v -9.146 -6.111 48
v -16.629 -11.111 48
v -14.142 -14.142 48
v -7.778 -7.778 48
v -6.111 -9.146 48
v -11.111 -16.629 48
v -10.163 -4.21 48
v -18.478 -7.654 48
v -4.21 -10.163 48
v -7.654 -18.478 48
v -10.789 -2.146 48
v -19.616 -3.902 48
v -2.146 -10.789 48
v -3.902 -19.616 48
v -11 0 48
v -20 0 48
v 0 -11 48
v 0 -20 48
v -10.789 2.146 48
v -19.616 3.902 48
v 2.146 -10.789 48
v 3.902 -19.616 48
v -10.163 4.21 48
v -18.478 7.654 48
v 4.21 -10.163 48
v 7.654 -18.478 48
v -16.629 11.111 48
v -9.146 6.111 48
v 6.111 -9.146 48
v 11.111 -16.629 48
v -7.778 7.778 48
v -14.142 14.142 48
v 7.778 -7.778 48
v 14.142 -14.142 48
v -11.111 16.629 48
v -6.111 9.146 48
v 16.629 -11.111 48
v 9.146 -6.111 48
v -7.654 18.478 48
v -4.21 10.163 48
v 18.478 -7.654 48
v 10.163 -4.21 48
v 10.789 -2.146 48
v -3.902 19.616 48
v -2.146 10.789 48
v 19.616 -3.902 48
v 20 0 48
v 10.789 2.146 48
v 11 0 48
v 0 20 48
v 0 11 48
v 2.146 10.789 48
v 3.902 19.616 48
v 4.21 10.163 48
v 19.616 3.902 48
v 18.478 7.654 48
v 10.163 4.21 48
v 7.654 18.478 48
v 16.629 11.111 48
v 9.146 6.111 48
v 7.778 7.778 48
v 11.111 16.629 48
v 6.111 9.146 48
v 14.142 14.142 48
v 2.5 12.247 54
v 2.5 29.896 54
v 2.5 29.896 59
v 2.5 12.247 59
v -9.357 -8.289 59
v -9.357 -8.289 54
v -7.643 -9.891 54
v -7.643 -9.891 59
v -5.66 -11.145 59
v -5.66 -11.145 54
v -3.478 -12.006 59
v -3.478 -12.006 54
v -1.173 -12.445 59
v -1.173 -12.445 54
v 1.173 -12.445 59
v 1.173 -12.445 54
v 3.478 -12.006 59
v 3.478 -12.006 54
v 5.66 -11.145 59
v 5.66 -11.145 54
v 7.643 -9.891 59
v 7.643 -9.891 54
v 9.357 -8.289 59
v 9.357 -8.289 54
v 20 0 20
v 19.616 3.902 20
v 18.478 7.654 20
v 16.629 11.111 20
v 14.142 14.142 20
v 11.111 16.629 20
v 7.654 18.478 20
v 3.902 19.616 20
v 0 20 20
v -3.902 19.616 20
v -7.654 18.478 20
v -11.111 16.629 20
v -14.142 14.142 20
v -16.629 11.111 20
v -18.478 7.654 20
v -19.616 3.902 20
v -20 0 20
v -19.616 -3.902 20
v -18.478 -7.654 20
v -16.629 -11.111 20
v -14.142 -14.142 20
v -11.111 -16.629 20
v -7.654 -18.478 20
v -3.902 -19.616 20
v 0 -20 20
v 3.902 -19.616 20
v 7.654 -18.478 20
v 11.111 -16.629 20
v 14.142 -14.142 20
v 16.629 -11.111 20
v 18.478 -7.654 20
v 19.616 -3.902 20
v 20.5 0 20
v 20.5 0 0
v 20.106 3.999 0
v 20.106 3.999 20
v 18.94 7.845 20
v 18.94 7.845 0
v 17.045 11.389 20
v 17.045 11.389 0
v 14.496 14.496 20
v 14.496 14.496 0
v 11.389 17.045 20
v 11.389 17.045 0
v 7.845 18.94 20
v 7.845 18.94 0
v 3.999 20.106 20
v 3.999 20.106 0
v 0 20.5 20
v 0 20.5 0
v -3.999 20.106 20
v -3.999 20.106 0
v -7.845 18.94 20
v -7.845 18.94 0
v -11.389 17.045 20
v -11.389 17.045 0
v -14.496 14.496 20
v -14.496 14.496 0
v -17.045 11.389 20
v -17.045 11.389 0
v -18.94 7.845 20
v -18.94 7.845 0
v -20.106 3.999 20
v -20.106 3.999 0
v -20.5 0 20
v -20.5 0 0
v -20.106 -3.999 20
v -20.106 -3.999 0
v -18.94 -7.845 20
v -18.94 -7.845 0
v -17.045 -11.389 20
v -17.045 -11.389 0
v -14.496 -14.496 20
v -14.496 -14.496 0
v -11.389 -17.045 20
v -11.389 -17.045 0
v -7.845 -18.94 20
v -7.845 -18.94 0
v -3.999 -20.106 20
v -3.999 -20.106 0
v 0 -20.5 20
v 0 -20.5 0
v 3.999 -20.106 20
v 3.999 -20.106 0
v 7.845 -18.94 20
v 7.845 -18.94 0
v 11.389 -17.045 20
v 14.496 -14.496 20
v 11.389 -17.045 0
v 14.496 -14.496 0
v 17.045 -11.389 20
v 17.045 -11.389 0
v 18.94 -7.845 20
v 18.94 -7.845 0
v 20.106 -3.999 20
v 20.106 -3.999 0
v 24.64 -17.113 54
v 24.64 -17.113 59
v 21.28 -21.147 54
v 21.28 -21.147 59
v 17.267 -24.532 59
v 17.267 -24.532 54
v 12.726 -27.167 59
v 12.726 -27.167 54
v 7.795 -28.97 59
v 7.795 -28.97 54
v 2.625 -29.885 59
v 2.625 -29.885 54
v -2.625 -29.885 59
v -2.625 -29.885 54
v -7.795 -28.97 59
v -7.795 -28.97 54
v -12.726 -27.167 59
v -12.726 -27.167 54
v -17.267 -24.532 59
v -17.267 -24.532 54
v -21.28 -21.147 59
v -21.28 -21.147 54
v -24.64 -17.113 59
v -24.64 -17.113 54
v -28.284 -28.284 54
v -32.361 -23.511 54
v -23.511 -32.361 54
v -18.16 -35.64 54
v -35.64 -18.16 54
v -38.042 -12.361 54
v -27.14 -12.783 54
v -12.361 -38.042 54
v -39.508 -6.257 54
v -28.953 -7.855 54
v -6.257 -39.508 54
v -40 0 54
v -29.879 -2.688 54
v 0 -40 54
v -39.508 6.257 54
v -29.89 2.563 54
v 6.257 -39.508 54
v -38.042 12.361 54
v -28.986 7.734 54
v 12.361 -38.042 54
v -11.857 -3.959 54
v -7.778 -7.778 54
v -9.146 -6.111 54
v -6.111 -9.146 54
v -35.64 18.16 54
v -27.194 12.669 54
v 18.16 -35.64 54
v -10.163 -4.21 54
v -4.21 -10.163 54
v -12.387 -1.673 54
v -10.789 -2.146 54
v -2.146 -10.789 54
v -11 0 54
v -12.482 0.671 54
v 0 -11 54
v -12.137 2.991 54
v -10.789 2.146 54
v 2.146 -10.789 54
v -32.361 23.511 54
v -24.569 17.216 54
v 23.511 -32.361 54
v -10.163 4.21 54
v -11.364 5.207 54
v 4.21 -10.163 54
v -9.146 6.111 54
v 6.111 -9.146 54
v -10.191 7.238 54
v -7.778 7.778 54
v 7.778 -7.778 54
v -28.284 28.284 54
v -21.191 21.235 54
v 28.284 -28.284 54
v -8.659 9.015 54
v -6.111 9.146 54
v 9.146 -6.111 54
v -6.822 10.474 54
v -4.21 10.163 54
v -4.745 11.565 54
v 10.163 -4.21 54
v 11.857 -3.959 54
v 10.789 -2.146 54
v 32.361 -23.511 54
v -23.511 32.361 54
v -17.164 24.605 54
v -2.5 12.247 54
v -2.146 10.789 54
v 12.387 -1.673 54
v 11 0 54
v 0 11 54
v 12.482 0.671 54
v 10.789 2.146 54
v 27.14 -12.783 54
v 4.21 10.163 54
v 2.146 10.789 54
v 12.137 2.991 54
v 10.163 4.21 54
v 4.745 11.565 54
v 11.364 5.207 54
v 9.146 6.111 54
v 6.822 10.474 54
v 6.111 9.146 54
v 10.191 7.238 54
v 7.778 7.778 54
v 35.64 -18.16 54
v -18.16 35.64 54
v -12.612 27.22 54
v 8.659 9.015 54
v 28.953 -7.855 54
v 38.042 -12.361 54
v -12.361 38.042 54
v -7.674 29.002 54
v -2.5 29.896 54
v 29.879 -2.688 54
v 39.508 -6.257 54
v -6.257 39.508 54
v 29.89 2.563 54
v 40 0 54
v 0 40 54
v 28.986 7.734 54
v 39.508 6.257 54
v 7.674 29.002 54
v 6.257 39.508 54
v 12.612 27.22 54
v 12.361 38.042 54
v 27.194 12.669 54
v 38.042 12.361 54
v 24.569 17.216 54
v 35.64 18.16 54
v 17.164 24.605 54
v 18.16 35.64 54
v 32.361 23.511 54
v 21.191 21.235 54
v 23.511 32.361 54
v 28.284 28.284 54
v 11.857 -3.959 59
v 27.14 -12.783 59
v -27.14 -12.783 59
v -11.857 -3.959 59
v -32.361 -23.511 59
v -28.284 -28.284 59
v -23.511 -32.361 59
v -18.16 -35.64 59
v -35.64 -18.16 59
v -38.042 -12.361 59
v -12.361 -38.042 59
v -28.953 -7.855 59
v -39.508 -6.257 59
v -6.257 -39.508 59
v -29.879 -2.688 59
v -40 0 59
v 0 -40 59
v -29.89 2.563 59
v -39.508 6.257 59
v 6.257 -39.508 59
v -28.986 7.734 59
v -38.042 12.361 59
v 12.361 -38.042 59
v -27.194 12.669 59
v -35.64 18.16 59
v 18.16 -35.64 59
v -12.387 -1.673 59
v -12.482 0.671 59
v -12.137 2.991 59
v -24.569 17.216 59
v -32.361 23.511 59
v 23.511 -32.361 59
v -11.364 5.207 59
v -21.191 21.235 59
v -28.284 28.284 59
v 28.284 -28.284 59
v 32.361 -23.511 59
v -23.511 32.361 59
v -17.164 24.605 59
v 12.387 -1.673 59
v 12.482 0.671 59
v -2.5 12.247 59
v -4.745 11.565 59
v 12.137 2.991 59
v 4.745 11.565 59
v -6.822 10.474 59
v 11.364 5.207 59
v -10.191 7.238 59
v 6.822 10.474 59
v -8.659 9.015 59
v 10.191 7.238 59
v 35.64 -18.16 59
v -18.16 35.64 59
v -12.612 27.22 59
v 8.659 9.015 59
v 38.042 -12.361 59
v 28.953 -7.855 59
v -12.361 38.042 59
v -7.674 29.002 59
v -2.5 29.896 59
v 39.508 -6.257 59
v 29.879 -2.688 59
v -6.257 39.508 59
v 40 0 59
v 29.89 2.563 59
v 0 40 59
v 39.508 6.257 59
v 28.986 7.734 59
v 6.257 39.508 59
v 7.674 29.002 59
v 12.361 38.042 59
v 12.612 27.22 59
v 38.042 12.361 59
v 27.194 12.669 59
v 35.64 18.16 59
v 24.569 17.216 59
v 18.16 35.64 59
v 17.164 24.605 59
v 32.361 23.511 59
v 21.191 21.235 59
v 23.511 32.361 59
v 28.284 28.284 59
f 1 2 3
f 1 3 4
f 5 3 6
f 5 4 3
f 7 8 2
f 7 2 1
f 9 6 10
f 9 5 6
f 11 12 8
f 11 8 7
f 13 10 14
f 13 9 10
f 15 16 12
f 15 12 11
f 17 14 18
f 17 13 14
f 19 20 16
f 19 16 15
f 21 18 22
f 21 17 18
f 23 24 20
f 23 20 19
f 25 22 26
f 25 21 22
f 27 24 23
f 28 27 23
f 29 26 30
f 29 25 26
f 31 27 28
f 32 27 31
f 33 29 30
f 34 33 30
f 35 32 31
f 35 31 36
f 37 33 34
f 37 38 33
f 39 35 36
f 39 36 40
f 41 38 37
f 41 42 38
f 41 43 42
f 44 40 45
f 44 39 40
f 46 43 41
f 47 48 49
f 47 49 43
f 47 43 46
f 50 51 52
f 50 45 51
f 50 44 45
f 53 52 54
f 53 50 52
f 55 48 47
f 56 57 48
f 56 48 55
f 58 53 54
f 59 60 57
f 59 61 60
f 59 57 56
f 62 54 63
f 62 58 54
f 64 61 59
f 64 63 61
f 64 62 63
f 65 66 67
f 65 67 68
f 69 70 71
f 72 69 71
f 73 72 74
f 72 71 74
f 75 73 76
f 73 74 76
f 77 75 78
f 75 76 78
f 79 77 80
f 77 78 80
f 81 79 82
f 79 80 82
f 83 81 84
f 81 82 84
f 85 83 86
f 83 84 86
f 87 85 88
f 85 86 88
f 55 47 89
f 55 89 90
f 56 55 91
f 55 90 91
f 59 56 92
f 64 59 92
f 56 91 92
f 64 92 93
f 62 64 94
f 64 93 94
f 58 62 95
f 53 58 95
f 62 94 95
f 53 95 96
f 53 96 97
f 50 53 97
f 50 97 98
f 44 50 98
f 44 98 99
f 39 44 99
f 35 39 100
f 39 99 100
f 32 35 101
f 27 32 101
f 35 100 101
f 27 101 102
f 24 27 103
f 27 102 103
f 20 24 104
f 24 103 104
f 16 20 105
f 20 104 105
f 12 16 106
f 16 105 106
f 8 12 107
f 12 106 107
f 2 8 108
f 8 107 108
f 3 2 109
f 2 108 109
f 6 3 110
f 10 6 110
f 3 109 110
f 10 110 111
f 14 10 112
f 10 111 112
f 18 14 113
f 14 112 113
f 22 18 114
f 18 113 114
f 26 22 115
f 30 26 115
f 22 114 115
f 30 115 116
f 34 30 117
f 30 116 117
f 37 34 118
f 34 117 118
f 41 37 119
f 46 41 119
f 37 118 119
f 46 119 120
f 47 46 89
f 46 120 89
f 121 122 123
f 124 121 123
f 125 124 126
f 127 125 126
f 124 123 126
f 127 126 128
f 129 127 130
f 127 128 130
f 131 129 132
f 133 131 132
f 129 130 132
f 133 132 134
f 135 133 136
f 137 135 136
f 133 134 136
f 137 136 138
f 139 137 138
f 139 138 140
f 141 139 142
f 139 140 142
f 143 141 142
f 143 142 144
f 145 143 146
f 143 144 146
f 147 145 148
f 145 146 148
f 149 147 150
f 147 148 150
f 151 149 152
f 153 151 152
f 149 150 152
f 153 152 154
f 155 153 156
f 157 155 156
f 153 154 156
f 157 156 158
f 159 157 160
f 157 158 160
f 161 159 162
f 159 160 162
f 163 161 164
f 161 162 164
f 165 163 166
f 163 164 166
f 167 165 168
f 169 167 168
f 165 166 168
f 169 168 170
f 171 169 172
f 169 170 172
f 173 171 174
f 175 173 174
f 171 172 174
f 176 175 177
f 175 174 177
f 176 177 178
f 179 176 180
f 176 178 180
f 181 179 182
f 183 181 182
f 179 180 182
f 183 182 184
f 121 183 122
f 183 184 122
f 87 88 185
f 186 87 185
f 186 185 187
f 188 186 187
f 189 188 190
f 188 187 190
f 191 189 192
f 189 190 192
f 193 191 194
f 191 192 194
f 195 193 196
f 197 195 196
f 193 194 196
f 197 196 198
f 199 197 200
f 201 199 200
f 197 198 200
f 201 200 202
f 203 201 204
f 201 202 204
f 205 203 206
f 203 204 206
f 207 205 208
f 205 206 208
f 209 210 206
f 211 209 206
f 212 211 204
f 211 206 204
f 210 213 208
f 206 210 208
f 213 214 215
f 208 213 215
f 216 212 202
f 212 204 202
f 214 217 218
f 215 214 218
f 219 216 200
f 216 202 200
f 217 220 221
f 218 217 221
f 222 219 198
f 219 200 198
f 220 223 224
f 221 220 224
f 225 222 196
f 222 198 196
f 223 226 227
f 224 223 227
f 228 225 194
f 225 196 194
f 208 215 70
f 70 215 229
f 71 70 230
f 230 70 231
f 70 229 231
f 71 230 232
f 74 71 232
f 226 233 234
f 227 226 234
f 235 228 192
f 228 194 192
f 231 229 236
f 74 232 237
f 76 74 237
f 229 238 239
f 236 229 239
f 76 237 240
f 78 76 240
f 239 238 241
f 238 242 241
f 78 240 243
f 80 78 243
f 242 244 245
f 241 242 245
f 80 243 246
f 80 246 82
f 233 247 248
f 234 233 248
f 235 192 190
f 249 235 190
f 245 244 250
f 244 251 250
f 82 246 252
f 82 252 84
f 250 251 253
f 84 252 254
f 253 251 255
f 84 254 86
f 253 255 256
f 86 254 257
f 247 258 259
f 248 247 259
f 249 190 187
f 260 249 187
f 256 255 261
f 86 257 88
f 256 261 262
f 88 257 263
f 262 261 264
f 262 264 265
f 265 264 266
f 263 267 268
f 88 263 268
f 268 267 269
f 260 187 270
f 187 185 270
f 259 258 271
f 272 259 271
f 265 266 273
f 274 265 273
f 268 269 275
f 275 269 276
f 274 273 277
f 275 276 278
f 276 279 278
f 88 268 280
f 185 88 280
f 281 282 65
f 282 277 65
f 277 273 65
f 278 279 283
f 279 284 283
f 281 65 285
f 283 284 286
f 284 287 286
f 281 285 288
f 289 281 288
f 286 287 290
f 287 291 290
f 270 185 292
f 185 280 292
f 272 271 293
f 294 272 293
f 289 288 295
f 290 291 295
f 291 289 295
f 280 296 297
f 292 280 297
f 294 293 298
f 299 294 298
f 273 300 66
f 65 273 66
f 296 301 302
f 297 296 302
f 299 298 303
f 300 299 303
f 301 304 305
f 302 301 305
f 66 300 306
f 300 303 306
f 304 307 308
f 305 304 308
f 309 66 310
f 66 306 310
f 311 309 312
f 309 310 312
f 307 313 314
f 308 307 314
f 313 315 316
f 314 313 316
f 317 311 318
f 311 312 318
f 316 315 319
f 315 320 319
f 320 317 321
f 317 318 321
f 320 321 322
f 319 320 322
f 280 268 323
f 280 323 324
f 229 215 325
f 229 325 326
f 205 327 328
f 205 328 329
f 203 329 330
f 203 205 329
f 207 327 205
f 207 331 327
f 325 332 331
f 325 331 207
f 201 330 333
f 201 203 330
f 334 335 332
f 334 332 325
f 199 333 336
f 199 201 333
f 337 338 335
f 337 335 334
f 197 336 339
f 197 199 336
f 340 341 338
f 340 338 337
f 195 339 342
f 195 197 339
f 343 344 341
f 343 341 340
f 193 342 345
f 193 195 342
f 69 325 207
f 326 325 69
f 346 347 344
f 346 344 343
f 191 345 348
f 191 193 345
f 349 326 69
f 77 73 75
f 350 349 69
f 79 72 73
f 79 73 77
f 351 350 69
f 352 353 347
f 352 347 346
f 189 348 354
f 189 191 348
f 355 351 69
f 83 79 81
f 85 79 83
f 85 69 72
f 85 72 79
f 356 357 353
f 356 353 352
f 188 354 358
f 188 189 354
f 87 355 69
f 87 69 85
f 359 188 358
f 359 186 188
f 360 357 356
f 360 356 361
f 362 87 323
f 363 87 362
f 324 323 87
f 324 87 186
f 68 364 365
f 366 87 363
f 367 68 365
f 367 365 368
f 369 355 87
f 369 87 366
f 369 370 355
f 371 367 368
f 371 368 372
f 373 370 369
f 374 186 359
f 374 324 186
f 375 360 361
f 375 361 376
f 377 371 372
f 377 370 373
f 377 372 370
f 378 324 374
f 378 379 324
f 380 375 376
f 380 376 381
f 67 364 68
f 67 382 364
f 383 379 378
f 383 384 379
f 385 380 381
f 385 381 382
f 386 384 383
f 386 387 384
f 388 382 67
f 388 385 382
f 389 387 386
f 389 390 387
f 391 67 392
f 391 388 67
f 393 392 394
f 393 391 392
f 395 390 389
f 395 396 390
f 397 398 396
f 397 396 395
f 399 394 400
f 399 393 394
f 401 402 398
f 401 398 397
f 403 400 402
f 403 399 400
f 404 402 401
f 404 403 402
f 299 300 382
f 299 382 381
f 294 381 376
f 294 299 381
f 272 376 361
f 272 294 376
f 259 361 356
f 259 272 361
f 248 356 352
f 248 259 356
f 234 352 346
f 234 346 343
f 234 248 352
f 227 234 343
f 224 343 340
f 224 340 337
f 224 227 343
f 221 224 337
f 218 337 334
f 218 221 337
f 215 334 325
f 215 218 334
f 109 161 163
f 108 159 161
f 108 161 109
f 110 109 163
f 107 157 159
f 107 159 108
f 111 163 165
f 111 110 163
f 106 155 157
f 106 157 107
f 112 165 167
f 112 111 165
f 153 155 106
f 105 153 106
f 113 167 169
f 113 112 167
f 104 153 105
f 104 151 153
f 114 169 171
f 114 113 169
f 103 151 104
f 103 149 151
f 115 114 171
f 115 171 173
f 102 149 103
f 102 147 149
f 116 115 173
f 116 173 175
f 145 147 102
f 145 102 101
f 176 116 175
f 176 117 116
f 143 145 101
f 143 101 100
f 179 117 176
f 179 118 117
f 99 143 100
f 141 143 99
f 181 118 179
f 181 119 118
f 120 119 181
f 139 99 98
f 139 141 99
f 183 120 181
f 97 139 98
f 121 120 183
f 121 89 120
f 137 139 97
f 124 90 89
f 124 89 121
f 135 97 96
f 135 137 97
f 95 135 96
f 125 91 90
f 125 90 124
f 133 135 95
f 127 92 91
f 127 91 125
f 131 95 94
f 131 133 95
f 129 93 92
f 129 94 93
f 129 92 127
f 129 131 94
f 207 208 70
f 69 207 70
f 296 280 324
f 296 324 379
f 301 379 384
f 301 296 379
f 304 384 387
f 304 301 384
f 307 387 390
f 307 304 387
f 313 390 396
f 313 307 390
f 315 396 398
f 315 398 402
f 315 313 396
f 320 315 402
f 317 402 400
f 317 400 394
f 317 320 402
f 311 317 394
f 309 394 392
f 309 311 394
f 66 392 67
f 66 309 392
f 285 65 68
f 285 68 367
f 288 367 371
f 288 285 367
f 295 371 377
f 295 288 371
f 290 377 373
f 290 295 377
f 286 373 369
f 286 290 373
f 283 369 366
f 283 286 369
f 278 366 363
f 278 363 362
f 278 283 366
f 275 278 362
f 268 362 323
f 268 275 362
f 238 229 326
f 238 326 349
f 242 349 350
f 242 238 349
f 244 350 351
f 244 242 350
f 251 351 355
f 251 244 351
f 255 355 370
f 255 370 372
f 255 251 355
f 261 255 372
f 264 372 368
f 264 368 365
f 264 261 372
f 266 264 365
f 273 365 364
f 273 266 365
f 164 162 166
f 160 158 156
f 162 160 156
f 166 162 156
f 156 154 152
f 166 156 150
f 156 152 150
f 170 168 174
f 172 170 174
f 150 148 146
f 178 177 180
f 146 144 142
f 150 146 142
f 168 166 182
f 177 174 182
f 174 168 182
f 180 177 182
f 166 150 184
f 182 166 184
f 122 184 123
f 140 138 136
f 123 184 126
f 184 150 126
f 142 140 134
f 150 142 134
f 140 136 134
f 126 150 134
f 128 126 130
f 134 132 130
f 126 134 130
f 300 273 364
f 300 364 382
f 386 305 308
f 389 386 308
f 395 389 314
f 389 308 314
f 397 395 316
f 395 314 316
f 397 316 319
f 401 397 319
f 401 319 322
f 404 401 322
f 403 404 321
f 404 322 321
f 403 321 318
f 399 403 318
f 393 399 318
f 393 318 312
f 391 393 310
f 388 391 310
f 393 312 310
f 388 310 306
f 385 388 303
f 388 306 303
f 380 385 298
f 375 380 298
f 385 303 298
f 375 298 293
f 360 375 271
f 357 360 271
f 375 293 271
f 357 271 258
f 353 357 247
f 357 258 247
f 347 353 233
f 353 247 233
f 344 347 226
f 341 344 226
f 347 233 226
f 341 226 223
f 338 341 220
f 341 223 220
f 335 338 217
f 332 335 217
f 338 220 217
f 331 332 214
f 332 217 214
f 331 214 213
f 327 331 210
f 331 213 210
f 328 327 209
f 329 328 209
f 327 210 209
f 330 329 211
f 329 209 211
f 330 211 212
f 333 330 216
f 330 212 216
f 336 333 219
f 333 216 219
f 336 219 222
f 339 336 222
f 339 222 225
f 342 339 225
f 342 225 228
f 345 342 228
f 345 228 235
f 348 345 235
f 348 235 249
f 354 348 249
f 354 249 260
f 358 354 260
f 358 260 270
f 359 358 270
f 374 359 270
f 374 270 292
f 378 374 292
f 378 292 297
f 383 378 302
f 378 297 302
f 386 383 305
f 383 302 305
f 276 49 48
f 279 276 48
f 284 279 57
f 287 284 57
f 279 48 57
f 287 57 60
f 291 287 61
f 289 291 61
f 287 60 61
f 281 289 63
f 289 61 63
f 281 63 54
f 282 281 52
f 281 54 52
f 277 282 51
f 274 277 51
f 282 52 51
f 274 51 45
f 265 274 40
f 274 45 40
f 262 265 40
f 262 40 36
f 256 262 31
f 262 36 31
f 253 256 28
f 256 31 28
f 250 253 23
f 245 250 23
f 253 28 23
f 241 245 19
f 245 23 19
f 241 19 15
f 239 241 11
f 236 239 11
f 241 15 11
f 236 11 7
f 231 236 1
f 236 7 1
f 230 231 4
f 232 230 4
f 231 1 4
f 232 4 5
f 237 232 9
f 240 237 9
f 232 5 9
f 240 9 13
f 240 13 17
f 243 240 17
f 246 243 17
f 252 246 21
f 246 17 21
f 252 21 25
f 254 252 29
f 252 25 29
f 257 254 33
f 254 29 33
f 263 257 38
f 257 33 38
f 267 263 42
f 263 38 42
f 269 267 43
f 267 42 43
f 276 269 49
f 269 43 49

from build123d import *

# Parameters (mm, degrees)
SKETCH_1_R      = 20.5
EXTRUDE_1_DEPTH = 20
SKETCH_4_R      = 20
EXTRUDE_4_DEPTH = 28
SKETCH_2_R      = 11
EXTRUDE_2_DEPTH = 6
SKETCH_3_R      = 40
EXTRUDE_3_DEPTH = 5


with BuildPart() as part:
    # 草图1 → 凸台-拉伸1 (new body)
    with BuildSketch(Plane.XY):
        Circle(SKETCH_1_R)
    extrude(amount=EXTRUDE_1_DEPTH)

    # 草图4 → 凸台-拉伸4 (add)
    with BuildSketch(Plane.XY.offset(20)):
        Circle(SKETCH_4_R)
    extrude(amount=EXTRUDE_4_DEPTH)

    # 草图2 → 凸台-拉伸2 (add)
    with BuildSketch(Plane.XY.offset(48)):
        Circle(SKETCH_2_R)
    extrude(amount=EXTRUDE_2_DEPTH)

    # 草图3 → 凸台-拉伸3 (add)
    with BuildSketch(Plane.XY.offset(54)):
        Circle(SKETCH_3_R)
        with BuildLine():
            Line((-2.5, 12.247448714), (-2.5, 29.895651858))
            ThreePointArc((-2.5, 29.895651858), (-25.980762114, 15), (-27.140393972, -12.782762419))
            Line((-27.140393972, -12.782762419), (-11.856601718, -3.958660847))
            ThreePointArc((-11.856601718, -3.958660847), (-10.825317547, 6.25), (-2.5, 12.247448714))
        make_face(mode=Mode.SUBTRACT)
        with BuildLine():
            Line((11.856601718, -3.958660847), (27.140393972, -12.782762419))
            ThreePointArc((27.140393972, -12.782762419), (25.980762114, 15), (2.5, 29.895651858))
            Line((2.5, 29.895651858), (2.5, 12.247448714))
            ThreePointArc((2.5, 12.247448714), (10.825317547, 6.25), (11.856601718, -3.958660847))
        make_face(mode=Mode.SUBTRACT)
        with BuildLine():
            Line((9.356601718, -8.288787866), (24.640393972, -17.112889438))
            ThreePointArc((24.640393972, -17.112889438), (0, -30), (-24.640393972, -17.112889438))
            Line((-24.640393972, -17.112889438), (-9.356601718, -8.288787866))
            ThreePointArc((-9.356601718, -8.288787866), (0, -12.5), (9.356601718, -8.288787866))
        make_face(mode=Mode.SUBTRACT)
    extrude(amount=EXTRUDE_3_DEPTH)


solid = part.part
